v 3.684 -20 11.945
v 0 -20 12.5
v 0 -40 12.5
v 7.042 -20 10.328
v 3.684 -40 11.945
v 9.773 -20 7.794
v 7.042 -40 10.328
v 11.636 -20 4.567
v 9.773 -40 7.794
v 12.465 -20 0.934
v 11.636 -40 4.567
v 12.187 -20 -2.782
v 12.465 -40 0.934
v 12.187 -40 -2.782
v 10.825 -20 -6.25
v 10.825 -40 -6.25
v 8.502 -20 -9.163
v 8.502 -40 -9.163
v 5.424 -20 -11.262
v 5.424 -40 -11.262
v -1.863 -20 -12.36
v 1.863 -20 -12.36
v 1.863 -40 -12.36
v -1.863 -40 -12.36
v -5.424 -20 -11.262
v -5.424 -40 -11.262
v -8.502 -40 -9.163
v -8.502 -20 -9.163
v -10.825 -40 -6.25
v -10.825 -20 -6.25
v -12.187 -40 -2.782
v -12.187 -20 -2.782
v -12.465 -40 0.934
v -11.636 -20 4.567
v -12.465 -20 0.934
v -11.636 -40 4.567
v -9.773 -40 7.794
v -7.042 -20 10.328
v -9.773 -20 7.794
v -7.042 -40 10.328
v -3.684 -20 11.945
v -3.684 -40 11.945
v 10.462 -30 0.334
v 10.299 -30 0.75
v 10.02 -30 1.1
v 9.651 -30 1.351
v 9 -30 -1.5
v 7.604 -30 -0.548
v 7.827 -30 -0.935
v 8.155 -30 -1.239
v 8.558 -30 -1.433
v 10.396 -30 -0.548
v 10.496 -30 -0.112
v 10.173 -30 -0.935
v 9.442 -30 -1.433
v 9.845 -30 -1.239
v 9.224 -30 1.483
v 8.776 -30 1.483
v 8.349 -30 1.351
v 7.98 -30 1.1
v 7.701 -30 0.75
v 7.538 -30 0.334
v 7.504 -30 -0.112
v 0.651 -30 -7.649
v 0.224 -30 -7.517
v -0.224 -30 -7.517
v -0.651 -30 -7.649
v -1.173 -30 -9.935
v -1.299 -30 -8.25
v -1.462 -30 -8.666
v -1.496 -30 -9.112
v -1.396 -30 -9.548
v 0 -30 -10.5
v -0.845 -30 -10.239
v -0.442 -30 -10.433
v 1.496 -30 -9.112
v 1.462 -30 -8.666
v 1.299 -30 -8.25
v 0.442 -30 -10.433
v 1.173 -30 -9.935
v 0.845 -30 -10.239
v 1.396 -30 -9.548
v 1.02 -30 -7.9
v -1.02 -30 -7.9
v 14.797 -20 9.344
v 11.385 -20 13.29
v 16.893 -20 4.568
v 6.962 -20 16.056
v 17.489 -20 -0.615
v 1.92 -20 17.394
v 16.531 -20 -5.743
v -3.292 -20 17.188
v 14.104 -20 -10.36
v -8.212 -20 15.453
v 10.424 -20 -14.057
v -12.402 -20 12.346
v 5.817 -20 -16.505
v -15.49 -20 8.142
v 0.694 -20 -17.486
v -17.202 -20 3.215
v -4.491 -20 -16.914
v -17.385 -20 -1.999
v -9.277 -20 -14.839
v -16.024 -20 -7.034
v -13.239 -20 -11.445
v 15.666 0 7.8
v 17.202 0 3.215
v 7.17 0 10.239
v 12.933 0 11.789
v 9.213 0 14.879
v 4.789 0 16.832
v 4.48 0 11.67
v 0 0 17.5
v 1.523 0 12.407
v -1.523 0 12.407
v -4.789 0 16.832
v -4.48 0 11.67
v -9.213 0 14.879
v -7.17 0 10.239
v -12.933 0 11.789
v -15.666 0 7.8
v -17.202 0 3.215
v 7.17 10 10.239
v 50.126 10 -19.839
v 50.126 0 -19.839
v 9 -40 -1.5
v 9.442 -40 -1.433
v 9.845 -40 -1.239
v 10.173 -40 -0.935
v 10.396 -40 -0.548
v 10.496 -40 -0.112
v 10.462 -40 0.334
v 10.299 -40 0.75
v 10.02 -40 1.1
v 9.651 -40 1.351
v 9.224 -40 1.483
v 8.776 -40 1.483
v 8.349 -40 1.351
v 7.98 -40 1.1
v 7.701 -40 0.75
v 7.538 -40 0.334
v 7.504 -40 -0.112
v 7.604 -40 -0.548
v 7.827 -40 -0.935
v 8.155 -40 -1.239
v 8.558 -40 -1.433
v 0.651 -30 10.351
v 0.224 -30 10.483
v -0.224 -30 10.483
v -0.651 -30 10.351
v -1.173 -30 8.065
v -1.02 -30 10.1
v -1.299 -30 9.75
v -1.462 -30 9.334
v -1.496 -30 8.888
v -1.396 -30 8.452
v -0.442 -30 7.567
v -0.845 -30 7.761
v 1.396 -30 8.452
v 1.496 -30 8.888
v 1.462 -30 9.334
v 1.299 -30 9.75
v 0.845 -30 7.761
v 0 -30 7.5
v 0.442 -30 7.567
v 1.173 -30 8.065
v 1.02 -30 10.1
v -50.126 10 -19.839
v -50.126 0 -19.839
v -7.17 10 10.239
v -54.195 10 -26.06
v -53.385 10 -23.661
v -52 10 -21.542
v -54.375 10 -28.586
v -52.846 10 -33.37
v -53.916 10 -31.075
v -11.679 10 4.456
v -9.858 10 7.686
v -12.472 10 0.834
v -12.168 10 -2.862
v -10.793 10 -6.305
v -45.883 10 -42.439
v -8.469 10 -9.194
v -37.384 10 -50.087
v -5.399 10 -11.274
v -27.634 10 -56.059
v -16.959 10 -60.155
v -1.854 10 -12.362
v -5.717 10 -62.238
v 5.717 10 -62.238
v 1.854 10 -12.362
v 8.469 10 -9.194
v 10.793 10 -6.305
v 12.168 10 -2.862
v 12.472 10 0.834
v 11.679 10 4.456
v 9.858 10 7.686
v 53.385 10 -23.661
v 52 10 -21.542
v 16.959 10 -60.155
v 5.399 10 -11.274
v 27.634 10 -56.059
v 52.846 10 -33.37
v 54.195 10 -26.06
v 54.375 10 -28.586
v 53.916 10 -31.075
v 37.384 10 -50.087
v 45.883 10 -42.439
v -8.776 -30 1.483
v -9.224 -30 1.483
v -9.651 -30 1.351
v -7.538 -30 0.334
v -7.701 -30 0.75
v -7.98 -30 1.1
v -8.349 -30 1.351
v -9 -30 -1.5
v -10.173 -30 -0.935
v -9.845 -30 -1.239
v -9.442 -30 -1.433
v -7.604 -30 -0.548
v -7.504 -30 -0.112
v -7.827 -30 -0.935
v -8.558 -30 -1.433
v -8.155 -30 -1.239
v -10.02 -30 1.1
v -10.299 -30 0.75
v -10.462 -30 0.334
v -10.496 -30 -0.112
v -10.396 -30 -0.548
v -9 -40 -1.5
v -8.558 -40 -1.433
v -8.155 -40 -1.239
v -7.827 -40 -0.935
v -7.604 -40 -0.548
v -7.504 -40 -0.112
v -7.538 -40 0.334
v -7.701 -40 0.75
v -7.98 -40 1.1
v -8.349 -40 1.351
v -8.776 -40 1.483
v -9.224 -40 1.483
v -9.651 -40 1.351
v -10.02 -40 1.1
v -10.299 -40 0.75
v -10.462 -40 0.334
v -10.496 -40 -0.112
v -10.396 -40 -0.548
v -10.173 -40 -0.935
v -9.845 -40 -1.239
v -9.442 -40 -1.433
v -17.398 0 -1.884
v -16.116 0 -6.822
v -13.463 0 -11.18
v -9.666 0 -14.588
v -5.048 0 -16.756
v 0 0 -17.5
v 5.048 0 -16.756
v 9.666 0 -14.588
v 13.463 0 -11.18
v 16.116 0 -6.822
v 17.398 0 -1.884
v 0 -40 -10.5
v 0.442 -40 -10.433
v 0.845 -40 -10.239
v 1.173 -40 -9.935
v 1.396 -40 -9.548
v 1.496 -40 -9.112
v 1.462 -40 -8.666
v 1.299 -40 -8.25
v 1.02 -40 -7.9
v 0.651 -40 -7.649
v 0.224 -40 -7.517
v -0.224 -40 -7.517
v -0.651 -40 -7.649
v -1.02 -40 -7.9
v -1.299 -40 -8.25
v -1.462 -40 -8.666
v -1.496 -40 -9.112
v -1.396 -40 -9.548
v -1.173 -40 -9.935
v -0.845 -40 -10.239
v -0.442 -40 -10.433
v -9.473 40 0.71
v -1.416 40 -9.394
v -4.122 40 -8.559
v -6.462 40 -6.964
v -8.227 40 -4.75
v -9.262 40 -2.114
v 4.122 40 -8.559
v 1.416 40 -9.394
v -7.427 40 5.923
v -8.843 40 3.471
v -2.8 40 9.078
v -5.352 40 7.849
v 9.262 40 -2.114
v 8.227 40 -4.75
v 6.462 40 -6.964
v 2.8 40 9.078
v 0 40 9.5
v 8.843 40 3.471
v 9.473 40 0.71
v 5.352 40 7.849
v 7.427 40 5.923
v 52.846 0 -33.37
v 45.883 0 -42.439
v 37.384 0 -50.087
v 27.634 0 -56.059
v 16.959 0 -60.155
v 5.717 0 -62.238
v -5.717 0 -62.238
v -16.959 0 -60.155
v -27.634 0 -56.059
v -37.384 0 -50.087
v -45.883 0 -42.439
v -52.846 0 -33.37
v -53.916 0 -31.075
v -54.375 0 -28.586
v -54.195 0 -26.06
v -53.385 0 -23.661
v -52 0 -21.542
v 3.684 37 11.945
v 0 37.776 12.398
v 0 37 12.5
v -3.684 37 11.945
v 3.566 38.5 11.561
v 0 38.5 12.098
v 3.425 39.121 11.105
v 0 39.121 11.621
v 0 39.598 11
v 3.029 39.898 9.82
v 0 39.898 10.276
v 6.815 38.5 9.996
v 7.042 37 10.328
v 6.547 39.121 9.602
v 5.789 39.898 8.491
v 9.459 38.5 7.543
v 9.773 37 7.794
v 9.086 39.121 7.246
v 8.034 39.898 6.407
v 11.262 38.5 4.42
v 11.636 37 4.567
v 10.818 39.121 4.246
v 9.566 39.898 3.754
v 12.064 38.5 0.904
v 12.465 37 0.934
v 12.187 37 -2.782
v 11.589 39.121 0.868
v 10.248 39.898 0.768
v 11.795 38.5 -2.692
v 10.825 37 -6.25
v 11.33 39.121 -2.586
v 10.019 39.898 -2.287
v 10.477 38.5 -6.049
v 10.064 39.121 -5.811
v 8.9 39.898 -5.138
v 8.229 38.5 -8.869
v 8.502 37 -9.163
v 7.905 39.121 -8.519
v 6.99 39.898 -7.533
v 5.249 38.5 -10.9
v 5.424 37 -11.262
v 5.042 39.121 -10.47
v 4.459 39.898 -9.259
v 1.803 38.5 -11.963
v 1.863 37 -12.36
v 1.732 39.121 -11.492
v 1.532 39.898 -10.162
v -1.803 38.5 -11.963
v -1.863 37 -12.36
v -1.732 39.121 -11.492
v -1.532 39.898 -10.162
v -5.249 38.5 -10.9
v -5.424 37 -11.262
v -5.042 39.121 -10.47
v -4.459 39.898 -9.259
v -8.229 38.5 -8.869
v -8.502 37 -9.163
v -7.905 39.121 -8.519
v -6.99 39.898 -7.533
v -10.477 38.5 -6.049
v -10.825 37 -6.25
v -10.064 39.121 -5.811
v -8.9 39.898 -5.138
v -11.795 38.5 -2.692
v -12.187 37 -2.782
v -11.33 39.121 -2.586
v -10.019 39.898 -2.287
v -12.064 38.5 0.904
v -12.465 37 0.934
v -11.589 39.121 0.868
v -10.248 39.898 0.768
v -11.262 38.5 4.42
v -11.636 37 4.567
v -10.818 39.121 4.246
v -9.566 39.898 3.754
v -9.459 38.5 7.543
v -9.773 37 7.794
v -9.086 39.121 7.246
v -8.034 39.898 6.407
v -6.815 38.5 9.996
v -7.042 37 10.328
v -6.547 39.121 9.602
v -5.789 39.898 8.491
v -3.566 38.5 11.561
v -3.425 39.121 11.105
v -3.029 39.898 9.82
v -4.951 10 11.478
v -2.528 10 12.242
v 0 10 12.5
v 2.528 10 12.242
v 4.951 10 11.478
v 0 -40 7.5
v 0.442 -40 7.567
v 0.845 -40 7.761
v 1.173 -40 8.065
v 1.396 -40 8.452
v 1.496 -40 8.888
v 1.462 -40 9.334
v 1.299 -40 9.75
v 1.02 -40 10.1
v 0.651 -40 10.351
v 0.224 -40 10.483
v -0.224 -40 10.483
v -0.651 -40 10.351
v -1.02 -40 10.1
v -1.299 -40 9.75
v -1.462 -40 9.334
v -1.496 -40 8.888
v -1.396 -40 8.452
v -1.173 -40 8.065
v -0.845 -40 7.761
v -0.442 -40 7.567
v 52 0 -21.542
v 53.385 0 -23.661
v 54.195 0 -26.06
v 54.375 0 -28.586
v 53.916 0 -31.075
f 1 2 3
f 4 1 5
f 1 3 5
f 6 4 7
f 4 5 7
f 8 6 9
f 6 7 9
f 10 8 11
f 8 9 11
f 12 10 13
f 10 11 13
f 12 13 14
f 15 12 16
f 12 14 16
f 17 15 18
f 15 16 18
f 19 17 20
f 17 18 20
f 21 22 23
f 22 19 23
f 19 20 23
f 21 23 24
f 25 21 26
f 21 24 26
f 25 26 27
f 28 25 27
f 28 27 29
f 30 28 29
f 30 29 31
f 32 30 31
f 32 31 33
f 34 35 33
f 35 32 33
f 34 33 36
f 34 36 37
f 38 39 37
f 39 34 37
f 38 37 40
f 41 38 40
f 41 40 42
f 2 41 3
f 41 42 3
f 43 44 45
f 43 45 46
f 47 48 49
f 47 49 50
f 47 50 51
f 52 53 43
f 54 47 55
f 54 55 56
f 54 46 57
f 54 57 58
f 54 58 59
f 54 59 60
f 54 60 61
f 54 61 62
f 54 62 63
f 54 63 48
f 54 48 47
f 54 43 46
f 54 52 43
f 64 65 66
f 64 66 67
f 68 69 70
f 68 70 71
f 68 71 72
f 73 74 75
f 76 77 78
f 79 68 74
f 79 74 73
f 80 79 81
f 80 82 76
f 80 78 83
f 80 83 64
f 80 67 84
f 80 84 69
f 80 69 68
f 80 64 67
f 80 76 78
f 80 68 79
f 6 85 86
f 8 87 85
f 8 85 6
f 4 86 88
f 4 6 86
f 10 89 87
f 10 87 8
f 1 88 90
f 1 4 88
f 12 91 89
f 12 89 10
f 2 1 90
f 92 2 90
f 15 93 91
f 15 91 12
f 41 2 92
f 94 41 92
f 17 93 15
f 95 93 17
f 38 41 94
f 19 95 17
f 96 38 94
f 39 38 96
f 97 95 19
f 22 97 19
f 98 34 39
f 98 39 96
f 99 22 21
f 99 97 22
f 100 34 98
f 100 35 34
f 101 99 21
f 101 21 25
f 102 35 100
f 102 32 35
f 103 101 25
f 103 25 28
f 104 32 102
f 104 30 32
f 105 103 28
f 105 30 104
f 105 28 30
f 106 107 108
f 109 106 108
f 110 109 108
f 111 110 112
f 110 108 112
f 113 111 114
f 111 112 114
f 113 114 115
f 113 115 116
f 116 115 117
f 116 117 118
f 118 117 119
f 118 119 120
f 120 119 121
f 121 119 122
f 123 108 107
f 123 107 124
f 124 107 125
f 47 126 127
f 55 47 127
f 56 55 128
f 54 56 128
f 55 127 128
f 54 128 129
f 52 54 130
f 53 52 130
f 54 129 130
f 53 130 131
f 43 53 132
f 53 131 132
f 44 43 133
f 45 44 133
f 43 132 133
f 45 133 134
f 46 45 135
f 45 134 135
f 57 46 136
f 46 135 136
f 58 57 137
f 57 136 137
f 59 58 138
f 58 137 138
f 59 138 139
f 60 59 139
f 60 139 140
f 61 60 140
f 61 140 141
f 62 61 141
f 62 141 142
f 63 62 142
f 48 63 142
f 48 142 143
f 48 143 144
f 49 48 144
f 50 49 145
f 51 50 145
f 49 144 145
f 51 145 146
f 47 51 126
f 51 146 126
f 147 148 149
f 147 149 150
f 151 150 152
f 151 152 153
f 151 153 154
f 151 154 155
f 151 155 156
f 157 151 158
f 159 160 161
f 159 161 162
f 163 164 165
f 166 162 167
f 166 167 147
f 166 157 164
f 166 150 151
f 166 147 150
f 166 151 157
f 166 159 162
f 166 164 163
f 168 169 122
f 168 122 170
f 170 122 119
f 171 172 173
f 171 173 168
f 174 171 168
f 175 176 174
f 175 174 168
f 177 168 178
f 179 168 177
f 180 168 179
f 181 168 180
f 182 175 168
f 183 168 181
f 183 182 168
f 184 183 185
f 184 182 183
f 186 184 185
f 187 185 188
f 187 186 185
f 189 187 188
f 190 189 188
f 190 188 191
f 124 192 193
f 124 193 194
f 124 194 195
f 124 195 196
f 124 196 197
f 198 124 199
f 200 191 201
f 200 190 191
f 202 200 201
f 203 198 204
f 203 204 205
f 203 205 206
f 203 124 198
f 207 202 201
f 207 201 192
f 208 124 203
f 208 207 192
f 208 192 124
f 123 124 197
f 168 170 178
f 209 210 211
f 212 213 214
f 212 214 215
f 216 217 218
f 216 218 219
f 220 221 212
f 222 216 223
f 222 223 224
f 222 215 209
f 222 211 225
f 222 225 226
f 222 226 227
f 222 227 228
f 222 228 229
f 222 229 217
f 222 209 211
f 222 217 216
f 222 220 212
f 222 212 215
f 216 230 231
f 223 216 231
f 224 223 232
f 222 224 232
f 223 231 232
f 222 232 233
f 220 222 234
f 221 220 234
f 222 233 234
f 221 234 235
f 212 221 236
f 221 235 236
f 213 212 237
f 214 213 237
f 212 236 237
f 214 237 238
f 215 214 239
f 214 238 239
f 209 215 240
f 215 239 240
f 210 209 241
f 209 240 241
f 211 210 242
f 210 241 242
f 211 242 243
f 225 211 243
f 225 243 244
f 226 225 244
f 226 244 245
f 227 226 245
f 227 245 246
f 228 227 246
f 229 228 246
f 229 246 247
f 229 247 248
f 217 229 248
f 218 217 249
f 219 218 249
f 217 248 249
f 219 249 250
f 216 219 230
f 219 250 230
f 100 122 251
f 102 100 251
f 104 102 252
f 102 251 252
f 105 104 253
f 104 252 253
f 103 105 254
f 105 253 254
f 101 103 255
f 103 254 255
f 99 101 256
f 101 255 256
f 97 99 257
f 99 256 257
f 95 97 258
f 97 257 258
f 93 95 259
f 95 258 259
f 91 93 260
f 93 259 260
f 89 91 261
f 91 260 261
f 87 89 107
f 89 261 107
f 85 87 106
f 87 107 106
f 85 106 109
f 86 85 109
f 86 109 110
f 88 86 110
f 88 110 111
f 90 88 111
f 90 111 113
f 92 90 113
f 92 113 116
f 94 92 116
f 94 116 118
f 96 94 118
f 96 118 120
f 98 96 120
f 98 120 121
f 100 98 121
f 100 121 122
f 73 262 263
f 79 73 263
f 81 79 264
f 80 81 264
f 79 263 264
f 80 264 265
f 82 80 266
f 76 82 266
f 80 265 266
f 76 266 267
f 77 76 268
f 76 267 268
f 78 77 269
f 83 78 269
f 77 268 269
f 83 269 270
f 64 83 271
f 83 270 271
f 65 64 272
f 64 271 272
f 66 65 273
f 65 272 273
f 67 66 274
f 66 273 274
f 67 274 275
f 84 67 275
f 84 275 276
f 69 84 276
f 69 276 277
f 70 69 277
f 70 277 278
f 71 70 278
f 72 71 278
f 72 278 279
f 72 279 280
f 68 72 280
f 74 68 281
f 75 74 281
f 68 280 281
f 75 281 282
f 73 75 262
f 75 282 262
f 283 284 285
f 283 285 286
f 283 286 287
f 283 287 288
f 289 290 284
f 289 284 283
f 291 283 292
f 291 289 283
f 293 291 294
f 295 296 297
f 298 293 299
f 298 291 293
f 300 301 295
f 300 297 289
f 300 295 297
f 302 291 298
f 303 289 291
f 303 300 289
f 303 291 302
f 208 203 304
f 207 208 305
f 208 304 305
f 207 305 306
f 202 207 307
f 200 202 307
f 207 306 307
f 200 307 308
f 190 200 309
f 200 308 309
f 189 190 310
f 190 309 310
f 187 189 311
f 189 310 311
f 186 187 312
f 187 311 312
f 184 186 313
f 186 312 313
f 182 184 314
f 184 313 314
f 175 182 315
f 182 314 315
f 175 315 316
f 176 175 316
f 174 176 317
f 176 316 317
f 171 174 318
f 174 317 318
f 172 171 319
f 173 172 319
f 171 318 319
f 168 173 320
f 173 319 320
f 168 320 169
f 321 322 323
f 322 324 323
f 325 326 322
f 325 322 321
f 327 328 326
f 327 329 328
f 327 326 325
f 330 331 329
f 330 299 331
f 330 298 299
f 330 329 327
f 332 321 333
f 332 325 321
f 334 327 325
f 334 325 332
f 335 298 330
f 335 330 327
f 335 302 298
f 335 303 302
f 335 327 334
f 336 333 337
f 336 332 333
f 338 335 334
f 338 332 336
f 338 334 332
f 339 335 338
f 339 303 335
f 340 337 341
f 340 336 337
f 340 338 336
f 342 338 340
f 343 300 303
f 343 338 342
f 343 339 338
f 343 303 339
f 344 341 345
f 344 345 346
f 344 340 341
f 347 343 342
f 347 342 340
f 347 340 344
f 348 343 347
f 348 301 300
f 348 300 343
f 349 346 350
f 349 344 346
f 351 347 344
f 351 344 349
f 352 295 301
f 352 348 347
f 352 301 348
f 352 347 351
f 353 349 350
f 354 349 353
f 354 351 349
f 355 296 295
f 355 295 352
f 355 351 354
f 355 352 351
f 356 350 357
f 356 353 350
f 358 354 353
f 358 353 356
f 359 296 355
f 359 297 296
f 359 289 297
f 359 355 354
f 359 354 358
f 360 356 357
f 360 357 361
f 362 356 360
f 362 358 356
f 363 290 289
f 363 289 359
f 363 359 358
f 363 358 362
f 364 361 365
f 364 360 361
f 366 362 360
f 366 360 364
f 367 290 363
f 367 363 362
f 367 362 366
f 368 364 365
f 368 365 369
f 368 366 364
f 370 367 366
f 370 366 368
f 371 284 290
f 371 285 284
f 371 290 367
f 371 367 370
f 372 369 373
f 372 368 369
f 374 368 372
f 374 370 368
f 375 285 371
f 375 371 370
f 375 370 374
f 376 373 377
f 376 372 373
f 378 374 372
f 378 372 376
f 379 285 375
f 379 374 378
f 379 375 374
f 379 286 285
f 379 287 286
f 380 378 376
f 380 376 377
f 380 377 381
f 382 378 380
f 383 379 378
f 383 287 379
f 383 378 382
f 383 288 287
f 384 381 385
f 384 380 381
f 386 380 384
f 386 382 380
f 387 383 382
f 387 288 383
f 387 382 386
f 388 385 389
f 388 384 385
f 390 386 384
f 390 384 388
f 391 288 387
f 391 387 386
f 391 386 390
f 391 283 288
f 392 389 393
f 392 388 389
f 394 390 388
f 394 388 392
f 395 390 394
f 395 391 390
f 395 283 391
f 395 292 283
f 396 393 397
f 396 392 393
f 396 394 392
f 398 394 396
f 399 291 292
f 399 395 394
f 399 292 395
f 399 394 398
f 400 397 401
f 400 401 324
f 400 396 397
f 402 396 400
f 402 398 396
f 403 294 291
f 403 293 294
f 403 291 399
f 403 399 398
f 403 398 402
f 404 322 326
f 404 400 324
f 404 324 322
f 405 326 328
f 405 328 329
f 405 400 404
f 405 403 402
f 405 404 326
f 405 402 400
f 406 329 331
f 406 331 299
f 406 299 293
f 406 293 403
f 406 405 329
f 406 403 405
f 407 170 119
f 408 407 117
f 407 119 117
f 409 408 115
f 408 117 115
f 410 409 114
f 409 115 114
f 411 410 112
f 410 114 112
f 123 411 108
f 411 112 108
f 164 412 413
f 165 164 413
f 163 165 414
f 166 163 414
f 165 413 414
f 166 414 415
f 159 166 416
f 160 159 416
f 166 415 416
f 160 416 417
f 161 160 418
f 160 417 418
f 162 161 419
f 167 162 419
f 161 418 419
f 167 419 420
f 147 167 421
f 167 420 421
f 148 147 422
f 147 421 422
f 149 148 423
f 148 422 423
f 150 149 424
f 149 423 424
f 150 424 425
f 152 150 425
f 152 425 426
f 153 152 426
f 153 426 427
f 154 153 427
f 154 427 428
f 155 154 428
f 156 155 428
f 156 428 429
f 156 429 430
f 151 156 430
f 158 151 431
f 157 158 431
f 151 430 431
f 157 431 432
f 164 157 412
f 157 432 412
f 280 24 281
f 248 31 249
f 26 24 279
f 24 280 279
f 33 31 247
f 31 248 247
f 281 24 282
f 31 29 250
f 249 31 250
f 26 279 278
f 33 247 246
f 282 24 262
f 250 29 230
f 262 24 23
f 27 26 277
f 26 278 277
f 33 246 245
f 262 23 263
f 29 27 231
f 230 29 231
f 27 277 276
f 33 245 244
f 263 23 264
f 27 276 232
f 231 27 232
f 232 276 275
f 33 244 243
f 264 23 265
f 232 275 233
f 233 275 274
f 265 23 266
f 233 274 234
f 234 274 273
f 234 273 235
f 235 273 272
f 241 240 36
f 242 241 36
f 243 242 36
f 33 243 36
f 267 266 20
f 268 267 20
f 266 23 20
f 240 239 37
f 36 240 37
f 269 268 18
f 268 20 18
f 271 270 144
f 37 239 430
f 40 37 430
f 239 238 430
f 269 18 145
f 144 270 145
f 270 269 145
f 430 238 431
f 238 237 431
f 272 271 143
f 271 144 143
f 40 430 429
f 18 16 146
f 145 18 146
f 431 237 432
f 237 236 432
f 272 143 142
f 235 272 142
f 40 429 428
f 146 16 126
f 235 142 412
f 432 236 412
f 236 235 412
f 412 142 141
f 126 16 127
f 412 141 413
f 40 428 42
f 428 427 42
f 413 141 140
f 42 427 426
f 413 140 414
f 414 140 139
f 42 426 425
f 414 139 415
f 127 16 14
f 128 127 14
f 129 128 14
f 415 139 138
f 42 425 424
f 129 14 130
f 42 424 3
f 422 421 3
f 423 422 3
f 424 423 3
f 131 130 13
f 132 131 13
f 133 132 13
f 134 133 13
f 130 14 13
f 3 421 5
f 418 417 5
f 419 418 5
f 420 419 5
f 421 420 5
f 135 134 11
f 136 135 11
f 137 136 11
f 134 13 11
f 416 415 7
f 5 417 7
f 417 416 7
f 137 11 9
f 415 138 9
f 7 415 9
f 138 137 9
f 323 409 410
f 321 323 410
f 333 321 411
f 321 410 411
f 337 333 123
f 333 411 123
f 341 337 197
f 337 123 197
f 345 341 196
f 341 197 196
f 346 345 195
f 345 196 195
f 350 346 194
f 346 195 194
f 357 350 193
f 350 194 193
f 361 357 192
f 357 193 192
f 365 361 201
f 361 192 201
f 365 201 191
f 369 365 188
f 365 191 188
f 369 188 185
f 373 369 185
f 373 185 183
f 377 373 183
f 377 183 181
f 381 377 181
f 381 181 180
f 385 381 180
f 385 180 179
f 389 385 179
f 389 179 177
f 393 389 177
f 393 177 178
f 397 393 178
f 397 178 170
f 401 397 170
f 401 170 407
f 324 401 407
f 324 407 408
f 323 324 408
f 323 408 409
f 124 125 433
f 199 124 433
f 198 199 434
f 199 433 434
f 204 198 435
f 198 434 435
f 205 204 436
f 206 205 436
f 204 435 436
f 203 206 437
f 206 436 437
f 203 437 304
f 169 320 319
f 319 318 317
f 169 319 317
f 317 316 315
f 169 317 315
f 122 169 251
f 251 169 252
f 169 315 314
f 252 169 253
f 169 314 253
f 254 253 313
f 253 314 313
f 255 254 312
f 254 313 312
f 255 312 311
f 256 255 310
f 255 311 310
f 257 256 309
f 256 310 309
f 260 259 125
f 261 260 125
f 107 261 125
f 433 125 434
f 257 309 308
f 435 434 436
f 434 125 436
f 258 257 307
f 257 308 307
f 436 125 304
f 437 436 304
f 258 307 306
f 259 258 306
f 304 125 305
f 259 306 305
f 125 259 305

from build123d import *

# Parameters (mm, degrees)
BOSS_EXTRUDE1_DEPTH      = 10
BOSS_EXTRUDE2_DEPTH      = 30
BOSS_EXTRUDE2_DEPTH_BACK = 50
SKETCH2_R                = 12.5
SKETCH3_R                = 17.5
BOSS_EXTRUDE3_DEPTH      = 20
FILLET1_R                = 3
SKETCH4_R                = 1.5
CUT_EXTRUDE1_DEPTH       = 10


with BuildPart() as part:
    # Sketch1 → Boss-Extrude1 (new body)
    with BuildSketch(Plane(origin=(0, 0, 0), x_dir=(1, 0, 0), z_dir=(0, 1, 0))):
        with BuildLine():
            Line((-50.126401, 19.839202), (-7.169705, -10.239401))
            ThreePointArc((-7.169705, -10.239401), (0, -12.5), (7.169705, -10.239401))
            Line((7.169705, -10.239401), (50.126401, 19.839202))
            ThreePointArc((50.126401, 19.839202), (54.194564, 26.060188), (52.845996, 33.369907))
            ThreePointArc((52.845996, 33.369907), (0, 62.5), (-52.845996, 33.369907))
            ThreePointArc((-52.845996, 33.369907), (-54.194564, 26.060188), (-50.126401, 19.839202))
        make_face()
    extrude(amount=BOSS_EXTRUDE1_DEPTH)

    # Sketch2 → Boss-Extrude2 (add, two sides: drawn at the far end of the back side and taken through both)
    with BuildSketch(Plane(origin=(0, 10, 0), x_dir=(1, 0, 0), z_dir=(0, 1, 0)).offset(-BOSS_EXTRUDE2_DEPTH_BACK)):
        with Locations(Location((0, 0, 0), (0, 0, 270))):
            Circle(SKETCH2_R)
    extrude(amount=BOSS_EXTRUDE2_DEPTH + BOSS_EXTRUDE2_DEPTH_BACK)

    # Sketch3 → Boss-Extrude3 (add)
    with BuildSketch(Plane.XZ):
        with Locations(Location((0, 0, 0), (0, 0, 169.415309))):
            Circle(SKETCH3_R)
    extrude(amount=BOSS_EXTRUDE3_DEPTH)

    # Fillet1
    fillet1_edges = [part.edges().sort_by_distance(p)[0] for p in [
        (0, 40, -12.5),
    ]]
    fillet(fillet1_edges, radius=FILLET1_R)

    # Sketch4 → Cut-Extrude1 (cut)
    with BuildSketch(Plane.XZ.offset(40)):
        with Locations(Location((0, 9, 0), (0, 0, 270))):
            Circle(SKETCH4_R)
        with Locations(Location((9, 0, 0), (0, 0, 270))):
            Circle(SKETCH4_R)
        with Locations(Location((0, -9, 0), (0, 0, 270))):
            Circle(SKETCH4_R)
        with Locations(Location((-9, 0, 0), (0, 0, 270))):
            Circle(SKETCH4_R)
    extrude(amount=-CUT_EXTRUDE1_DEPTH, mode=Mode.SUBTRACT)


solid = part.part
